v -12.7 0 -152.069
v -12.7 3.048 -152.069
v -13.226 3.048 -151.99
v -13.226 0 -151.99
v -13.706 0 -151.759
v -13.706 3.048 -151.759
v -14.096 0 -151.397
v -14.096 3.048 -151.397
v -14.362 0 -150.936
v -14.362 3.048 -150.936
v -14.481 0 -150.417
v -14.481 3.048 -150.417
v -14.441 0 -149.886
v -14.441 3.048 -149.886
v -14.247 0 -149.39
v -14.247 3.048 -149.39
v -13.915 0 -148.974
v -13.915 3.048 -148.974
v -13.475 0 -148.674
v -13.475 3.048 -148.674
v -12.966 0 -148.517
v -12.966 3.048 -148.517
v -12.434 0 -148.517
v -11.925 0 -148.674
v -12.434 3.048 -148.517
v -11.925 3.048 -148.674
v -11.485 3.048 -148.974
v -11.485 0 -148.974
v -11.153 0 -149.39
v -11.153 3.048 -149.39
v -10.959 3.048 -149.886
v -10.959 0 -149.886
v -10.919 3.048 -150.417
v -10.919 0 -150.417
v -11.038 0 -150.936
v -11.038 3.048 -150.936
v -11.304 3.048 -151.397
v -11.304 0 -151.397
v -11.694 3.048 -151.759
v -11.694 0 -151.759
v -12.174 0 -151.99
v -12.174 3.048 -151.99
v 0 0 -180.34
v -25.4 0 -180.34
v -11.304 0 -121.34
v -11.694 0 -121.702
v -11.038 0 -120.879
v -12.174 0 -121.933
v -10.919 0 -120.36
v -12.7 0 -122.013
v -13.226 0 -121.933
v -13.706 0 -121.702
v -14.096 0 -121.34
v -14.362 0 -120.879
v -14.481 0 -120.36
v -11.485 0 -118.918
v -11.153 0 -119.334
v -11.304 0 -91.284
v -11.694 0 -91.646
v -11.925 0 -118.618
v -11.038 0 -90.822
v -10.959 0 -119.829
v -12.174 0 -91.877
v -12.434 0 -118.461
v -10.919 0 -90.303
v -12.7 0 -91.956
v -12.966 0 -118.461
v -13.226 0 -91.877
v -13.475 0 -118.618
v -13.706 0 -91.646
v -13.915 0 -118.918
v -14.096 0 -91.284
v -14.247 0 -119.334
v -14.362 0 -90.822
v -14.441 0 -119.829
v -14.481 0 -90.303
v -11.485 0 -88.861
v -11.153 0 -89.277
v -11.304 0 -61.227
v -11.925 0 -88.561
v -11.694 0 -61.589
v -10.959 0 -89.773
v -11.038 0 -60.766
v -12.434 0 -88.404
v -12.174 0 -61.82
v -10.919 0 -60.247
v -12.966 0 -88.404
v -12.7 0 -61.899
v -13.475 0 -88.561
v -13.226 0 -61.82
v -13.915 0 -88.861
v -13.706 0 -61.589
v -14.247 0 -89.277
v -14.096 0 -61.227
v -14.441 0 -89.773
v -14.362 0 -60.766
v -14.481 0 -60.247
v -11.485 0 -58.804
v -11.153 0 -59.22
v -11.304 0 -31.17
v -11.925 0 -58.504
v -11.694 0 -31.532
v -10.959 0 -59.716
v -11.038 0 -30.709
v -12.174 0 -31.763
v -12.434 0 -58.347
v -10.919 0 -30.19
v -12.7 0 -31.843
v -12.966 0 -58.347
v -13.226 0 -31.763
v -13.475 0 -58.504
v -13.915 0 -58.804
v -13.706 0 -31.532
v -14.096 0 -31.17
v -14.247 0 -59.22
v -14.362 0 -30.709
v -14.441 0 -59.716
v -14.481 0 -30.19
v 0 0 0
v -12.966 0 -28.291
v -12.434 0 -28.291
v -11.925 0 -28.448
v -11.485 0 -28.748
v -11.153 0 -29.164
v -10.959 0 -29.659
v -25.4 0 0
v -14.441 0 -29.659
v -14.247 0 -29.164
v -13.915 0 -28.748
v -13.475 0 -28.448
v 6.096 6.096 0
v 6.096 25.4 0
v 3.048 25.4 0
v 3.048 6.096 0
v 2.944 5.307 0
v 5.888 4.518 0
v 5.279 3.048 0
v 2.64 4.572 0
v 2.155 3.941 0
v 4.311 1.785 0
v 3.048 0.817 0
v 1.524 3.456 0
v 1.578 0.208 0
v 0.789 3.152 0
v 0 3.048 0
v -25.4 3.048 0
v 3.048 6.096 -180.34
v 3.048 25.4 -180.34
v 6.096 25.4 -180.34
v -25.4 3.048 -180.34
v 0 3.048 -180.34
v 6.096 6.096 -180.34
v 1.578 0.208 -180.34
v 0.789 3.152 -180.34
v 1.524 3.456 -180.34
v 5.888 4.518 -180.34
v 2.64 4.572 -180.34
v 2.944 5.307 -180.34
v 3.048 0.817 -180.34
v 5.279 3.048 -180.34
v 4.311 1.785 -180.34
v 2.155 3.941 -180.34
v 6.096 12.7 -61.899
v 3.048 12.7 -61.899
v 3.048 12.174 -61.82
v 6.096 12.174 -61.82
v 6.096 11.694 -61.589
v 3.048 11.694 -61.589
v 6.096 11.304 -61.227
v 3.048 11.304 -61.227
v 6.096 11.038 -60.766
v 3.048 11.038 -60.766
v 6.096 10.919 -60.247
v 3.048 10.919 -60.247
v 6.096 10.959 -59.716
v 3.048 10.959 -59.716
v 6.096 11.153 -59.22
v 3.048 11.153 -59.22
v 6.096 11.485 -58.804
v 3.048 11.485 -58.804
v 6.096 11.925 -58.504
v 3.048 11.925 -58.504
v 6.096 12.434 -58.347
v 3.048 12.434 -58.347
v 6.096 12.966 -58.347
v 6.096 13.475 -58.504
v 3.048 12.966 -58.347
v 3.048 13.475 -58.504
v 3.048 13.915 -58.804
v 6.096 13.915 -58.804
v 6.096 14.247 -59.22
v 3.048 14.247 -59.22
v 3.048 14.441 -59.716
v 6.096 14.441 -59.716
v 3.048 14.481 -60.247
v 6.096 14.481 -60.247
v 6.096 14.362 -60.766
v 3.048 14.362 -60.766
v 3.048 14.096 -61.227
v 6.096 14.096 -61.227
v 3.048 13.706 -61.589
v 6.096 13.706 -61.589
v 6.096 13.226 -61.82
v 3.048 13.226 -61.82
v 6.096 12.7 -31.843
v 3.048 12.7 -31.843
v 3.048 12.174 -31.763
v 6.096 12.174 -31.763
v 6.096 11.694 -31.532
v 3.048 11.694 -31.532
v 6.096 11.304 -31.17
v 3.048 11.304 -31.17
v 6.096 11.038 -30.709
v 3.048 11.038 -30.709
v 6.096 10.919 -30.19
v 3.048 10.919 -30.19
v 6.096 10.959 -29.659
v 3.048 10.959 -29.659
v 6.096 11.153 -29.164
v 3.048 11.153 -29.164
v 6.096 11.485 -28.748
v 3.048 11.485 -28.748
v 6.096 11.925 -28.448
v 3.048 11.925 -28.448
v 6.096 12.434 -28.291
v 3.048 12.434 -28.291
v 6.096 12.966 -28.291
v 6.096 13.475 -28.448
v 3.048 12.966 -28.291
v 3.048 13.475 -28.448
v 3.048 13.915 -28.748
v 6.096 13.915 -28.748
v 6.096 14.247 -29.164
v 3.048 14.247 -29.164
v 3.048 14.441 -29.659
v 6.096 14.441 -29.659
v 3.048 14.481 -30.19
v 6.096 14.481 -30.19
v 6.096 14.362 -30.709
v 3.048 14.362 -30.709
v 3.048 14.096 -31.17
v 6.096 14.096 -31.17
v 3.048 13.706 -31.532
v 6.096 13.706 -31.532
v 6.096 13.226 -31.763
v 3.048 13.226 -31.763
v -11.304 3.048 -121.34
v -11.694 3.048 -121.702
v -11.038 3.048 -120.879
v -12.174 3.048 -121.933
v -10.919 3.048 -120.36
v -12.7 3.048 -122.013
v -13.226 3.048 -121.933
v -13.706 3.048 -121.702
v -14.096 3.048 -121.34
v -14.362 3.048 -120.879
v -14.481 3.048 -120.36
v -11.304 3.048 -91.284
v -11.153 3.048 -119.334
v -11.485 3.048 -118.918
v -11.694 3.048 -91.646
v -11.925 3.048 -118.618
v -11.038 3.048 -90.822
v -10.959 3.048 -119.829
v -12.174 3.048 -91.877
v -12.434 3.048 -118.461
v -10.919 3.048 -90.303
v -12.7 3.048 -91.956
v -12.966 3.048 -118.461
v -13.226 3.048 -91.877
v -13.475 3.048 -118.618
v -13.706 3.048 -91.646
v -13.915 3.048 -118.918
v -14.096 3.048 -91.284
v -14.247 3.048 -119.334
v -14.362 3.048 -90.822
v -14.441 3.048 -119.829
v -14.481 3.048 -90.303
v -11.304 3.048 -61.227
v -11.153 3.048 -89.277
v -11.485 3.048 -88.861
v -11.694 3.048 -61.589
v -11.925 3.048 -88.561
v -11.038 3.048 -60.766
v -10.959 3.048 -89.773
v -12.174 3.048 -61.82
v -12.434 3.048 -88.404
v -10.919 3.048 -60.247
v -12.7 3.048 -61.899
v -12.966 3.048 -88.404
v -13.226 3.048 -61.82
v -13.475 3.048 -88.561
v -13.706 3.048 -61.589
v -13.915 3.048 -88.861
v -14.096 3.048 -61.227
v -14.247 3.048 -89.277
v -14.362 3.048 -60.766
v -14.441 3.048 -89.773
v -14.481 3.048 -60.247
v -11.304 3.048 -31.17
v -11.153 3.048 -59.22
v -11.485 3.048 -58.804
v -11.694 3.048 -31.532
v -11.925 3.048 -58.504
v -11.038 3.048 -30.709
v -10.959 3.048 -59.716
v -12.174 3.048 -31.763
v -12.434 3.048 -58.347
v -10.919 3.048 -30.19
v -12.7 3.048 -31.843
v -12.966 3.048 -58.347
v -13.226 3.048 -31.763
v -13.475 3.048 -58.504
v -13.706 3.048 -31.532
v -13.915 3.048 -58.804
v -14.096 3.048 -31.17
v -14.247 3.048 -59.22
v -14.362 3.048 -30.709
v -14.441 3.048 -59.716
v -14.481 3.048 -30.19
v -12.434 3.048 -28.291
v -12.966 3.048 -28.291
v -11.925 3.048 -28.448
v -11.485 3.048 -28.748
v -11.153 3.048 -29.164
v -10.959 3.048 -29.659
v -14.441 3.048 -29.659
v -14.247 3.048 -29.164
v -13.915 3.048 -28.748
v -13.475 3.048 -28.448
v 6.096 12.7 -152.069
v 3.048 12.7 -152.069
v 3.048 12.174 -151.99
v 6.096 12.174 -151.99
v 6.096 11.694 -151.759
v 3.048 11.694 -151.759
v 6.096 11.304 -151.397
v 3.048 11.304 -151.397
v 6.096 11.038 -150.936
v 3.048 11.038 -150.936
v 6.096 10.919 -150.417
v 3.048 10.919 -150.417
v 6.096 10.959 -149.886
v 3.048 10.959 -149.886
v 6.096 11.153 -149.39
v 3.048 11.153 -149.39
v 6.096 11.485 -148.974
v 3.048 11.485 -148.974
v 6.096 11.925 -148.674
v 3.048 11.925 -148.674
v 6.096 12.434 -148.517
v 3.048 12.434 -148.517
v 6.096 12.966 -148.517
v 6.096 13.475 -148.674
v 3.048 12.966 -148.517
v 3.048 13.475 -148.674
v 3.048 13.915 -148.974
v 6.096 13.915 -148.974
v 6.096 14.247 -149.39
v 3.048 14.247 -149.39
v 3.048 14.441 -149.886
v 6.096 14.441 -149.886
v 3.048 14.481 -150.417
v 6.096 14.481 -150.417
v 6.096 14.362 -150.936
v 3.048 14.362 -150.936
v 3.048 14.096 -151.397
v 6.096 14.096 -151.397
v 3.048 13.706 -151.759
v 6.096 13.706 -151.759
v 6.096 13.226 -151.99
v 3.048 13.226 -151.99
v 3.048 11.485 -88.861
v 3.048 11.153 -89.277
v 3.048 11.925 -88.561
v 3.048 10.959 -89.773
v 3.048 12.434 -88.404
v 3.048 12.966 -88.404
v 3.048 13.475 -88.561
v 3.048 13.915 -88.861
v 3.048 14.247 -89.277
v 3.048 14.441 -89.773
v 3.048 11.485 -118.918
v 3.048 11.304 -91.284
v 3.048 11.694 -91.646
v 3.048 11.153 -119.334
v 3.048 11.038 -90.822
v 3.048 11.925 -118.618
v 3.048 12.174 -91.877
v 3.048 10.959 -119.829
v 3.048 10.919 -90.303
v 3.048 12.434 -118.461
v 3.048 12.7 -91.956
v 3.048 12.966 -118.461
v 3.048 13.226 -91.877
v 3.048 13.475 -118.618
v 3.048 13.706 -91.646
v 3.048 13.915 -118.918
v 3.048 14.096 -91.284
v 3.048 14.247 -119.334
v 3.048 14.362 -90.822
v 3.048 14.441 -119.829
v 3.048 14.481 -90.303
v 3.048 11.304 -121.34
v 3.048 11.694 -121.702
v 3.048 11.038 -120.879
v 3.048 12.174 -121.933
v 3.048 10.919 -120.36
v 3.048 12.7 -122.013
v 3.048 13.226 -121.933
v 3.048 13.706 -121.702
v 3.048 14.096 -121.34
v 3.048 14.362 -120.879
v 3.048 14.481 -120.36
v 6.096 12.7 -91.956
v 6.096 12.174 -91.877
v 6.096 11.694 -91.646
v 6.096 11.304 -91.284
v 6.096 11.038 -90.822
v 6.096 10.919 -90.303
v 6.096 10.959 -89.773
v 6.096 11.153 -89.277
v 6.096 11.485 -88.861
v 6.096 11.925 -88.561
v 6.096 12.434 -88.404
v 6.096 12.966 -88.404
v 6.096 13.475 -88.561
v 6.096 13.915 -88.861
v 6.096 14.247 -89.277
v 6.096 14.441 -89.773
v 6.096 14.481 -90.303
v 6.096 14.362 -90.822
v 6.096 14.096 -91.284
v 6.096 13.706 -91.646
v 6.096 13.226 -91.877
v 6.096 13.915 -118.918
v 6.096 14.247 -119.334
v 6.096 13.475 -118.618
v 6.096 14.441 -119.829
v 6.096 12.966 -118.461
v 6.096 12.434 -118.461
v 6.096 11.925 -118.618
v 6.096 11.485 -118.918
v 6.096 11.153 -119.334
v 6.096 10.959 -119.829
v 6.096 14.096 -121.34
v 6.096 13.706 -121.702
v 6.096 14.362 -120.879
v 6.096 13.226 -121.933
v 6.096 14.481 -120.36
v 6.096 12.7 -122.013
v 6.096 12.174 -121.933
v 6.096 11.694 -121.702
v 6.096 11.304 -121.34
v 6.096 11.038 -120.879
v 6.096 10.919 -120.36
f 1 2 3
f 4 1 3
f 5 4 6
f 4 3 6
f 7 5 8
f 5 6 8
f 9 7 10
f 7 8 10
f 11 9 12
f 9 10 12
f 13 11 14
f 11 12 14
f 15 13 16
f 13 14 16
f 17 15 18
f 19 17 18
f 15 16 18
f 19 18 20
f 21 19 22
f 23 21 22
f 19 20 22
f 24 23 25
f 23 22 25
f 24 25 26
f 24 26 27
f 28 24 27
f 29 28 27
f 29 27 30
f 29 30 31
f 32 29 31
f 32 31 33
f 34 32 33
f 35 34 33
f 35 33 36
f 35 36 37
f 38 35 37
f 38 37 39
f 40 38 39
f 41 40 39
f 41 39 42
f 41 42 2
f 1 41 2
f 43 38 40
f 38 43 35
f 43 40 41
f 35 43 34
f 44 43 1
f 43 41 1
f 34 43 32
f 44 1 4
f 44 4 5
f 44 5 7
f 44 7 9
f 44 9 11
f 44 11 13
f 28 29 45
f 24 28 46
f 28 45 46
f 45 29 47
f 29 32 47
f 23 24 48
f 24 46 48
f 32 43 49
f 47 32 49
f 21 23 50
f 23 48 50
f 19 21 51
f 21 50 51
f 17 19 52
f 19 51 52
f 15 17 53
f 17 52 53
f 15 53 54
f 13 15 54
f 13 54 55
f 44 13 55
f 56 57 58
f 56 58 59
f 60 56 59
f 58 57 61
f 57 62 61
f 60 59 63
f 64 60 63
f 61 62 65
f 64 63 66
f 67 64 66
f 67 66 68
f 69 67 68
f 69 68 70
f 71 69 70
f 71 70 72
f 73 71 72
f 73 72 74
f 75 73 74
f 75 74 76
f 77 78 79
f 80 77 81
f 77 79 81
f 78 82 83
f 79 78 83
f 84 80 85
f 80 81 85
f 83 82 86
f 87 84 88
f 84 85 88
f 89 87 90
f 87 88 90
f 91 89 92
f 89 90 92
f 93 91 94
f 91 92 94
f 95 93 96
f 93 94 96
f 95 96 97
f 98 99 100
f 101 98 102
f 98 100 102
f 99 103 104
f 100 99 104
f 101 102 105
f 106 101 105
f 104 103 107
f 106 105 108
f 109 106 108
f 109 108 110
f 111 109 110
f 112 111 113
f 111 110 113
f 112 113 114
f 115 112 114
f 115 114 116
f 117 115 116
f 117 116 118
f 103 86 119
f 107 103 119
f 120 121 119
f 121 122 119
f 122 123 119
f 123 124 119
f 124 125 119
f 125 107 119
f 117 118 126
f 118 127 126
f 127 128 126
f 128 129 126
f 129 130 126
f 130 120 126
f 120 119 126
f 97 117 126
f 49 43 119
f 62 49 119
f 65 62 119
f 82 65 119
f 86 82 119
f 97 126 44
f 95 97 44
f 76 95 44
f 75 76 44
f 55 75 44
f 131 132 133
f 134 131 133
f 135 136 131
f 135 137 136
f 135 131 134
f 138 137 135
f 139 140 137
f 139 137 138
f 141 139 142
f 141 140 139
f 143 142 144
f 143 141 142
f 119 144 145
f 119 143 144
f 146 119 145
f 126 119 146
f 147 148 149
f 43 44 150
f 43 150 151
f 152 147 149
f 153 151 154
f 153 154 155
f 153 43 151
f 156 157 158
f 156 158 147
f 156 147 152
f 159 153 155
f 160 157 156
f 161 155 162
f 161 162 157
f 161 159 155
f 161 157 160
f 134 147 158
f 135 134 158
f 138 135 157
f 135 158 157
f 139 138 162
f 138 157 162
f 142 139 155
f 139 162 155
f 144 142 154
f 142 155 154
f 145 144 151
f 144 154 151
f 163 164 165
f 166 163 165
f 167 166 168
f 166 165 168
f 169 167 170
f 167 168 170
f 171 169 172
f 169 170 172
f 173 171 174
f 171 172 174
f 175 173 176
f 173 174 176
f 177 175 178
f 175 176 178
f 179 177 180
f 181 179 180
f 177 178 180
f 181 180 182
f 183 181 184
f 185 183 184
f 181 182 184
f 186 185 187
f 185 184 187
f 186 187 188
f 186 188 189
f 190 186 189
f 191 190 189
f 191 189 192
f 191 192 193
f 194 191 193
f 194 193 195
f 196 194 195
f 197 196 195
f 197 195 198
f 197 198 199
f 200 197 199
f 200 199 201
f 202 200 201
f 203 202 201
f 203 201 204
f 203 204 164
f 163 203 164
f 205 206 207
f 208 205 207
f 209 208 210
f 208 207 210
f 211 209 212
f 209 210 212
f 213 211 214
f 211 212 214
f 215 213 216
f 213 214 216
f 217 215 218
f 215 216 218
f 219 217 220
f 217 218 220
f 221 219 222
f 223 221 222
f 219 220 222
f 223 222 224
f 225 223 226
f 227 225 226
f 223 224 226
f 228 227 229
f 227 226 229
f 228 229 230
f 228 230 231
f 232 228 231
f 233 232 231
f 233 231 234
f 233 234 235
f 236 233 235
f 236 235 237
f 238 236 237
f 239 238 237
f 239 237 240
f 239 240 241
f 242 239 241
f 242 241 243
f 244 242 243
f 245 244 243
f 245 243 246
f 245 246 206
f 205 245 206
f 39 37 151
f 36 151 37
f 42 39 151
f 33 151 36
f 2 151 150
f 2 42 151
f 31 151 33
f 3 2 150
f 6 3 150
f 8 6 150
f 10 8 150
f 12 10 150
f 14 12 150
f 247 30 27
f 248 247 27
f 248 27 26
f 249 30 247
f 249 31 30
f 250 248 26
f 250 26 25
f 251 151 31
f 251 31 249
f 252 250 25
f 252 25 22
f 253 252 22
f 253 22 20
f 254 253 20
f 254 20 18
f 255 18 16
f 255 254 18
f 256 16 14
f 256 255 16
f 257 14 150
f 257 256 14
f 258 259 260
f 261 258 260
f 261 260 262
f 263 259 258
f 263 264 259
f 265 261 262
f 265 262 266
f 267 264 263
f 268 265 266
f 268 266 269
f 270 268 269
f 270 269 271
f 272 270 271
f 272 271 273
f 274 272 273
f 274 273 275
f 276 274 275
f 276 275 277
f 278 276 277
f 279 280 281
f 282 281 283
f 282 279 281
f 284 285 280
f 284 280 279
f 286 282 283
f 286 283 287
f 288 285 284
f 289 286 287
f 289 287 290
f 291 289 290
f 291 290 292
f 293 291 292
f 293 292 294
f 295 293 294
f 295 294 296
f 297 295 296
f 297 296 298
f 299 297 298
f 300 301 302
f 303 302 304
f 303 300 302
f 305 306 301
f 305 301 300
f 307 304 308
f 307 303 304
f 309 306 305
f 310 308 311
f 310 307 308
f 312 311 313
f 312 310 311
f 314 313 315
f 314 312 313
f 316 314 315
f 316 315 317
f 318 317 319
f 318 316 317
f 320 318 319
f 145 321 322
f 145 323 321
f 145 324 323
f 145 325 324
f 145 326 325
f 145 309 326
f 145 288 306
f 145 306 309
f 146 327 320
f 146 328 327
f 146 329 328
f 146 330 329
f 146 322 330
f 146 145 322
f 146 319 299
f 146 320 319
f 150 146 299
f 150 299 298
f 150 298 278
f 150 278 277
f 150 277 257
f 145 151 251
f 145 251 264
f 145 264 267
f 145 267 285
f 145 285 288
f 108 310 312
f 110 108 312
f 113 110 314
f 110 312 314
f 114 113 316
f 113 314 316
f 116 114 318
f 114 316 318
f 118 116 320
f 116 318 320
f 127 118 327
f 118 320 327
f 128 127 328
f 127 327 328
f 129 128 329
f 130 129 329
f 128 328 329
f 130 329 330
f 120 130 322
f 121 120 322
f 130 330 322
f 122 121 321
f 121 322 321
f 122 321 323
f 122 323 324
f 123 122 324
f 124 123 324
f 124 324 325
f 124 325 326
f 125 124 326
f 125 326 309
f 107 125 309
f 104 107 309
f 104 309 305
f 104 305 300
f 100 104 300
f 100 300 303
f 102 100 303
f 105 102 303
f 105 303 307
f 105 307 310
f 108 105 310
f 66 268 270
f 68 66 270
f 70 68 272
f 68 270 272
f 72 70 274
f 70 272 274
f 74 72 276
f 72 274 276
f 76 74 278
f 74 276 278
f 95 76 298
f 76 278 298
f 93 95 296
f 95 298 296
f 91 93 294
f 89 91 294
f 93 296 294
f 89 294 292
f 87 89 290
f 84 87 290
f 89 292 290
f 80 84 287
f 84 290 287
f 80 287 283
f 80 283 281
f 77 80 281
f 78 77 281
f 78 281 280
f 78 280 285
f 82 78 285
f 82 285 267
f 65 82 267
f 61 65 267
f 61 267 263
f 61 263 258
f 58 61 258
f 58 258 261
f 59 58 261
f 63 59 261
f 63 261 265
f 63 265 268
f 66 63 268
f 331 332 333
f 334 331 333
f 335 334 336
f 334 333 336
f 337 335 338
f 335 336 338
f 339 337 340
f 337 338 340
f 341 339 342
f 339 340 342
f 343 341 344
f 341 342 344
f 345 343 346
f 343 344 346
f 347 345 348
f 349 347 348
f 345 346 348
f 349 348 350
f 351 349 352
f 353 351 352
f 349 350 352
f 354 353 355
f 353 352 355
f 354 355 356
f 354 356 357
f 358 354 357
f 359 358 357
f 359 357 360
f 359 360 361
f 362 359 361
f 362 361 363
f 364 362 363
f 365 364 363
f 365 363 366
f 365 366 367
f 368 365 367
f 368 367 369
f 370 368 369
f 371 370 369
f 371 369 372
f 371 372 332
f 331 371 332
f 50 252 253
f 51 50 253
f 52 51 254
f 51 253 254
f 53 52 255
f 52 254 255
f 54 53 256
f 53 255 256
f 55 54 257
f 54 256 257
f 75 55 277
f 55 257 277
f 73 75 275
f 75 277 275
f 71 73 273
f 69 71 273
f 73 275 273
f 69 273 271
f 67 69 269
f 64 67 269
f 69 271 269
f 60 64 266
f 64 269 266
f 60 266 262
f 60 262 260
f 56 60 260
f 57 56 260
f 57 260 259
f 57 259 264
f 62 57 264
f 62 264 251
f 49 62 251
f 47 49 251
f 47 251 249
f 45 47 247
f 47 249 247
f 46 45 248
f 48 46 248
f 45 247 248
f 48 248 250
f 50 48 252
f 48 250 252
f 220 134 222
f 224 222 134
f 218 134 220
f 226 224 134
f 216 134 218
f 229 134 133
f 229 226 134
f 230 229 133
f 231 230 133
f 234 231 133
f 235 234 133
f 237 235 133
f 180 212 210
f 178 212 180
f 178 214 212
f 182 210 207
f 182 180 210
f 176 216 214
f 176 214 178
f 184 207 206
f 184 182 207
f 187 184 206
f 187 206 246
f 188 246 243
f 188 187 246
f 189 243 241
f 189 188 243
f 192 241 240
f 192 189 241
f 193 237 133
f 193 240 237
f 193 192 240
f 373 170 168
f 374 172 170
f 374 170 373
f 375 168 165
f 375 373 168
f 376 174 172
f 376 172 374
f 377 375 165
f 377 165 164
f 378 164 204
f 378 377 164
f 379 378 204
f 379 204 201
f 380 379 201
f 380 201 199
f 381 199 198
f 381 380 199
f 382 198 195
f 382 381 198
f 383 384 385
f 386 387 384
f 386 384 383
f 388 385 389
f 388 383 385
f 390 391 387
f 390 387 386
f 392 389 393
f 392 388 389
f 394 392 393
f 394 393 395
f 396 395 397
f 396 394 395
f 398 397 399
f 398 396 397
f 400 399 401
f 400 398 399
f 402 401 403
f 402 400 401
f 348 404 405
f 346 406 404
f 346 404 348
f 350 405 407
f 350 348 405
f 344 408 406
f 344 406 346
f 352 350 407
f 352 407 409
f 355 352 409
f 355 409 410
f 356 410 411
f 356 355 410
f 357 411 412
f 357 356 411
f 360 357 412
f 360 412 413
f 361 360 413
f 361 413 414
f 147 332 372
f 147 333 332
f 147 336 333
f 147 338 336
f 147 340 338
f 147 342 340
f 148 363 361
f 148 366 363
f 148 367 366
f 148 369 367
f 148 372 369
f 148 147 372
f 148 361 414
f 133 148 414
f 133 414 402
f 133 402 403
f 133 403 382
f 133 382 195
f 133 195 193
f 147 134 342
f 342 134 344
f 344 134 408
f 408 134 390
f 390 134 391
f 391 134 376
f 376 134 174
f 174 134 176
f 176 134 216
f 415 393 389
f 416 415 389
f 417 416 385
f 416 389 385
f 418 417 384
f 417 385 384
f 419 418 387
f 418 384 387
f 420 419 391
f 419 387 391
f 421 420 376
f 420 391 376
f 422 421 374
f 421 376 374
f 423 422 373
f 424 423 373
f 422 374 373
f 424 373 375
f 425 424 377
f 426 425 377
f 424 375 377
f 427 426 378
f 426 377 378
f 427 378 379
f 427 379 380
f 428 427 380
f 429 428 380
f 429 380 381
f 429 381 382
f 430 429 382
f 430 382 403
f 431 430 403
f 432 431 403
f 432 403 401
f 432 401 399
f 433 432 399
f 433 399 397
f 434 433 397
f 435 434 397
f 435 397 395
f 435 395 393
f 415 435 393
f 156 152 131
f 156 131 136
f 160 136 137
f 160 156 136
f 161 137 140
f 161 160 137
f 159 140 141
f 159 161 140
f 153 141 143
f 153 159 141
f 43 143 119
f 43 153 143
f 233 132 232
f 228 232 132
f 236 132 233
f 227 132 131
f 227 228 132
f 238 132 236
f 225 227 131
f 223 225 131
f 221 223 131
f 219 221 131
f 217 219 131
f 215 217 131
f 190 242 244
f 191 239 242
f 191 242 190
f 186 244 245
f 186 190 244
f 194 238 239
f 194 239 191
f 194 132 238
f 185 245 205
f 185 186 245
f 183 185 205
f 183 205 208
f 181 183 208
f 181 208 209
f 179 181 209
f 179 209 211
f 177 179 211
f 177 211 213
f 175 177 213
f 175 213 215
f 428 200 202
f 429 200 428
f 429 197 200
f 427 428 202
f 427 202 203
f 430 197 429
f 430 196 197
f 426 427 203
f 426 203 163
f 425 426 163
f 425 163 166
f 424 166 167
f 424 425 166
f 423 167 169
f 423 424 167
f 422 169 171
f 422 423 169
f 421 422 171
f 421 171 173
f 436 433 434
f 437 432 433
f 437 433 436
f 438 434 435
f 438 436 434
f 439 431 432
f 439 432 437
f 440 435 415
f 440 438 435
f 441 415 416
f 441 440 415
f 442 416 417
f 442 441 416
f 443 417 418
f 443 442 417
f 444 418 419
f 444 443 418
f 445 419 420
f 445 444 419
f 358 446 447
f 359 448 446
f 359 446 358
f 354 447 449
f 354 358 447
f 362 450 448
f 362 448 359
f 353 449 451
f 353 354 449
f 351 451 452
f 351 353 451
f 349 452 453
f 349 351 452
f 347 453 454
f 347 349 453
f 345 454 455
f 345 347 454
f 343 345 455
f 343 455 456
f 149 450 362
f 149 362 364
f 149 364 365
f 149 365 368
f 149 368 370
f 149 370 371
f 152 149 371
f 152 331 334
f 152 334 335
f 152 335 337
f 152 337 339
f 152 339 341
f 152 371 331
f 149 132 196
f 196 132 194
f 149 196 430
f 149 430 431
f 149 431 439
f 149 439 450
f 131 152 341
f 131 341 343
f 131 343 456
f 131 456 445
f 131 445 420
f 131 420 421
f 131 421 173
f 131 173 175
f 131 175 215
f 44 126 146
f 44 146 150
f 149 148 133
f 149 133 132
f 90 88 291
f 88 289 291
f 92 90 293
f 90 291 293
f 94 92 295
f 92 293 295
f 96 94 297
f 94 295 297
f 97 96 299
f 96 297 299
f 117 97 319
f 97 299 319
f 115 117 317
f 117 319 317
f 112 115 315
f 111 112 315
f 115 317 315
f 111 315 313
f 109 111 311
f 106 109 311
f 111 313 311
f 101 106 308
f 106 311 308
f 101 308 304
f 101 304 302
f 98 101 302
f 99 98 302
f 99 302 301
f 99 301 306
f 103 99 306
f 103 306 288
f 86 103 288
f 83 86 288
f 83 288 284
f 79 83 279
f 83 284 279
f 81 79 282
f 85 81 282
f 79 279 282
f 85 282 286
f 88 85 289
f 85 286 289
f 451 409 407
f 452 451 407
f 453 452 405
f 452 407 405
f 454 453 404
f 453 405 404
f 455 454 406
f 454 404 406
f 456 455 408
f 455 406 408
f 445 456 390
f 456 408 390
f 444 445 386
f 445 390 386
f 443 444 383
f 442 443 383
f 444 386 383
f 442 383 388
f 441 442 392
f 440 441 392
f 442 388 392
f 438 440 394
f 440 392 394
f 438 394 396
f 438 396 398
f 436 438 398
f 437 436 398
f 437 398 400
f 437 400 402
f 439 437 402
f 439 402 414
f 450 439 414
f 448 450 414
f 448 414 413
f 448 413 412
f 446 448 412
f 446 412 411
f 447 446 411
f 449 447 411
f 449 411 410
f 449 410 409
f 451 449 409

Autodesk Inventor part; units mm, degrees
ref_plane "YZ Plane" through (0, 0, 0) normal (1, 0, 0) x (0, 1, 0)
ref_plane "XZ Plane" through (0, 0, 0) normal (0, 1, 0) x (-1, 0, 0)
ref_plane "XY Plane" through (0, 0, 0) normal (0, 0, 1) x (1, 0, 0)
sketch "Sketch1" plane through (0, 0, 0) normal (0, 1, 0) x (-1, 0, 0)
  line L0 (0, 0) -> (25.4, 0)
  line L1 (25.4, 0) -> (25.4, -180.34)
  line L2 (25.4, -180.34) -> (0, -180.34)
  line L3 (0, -180.34) -> (0, 0)
  dimension "d0" = 25.4
  dimension "d1" = 180.34
extrude "Plate1" add sketch "Sketch1" along normal blind 3.048
sketch "Sketch2" plane through (3.048, 6.096, -180.34) normal (1, 0, 0) x (0, 1, 0)
  line L0 (0, 180.34) -> (0, 0)
  line L1 (0, 0) -> (19.304, 0)
  line L2 (19.304, 0) -> (19.304, 180.34)
  line L3 (19.304, 180.34) -> (0, 180.34)
edge flange "Flange1" height 25.4 angle 90 thickness 3.048 bend radius 3.048 thickness toward (1, 0, 0) relief tear relief width 3.048 relief depth 1.524 edges at (0, 3.048, -90.17) wall of the first edge with corners at (3.048, 6.096, 0) (3.048, 6.096, -180.34) (3.048, 25.4, -180.34) (3.048, 25.4, 0)
bend "Bend1"
corner "Corner1"
sketch "Sketch3" plane through (0, 0, 0) normal (0, -1, 0) x (1, 0, 0)
  line L0 (-25.4, 0) -> (-25.4, -180.34) projected
  line L1 (-25.4, -180.34) -> (0, -180.34) construction
  line L2 (-12.7, -180.34) -> (-12.7, -150.2833) construction
  line L3 (-12.7, -150.2833) -> (-12.7, -120.2267) construction
  line L4 (-12.7, -120.2267) -> (-12.7, -90.17) construction
  line L5 (-12.7, -90.17) -> (-12.7, -60.1133) construction
  line L6 (-12.7, -60.1133) -> (-12.7, -30.0567) construction
  line L7 (-12.7, -30.0567) -> (-12.7, 0) construction
  line L8 (0, 0) -> (-25.4, 0) construction
  dimension "d13" = 12.7
hole "Hole1" at (-12.7, 0, -120.2267) at (-12.7, 0, -150.2833) at (-12.7, 0, -90.17) at (-12.7, 0, -60.1133) at (-12.7, 0, -30.0567) direction (0, 1, 0) diameter 3.5719 depth 3.048 tip angle 118
sketch "Sketch4" plane through (6.096, 25.4, 0) normal (1, 0, 0) x (0, 0, -1)
  line L0 (0, -12.7) -> (30.0567, -12.7) construction
  line L1 (30.0567, -12.7) -> (60.1133, -12.7) construction
  line L2 (60.1133, -12.7) -> (90.17, -12.7) construction
  line L3 (90.17, -12.7) -> (120.2267, -12.7) construction
  line L4 (120.2267, -12.7) -> (150.2833, -12.7) construction
  line L5 (150.2833, -12.7) -> (180.34, -12.7) construction
  line L6 (180.34, -25.4) -> (0, -25.4) projected
  line L7 (180.34, 0) -> (180.34, -19.304) projected
  line L8 (0, -19.304) -> (0, 0) projected
  dimension "d21" = 12.7
hole "Hole2" at (6.096, 12.7, -30.0567) at (6.096, 12.7, -60.1133) at (6.096, 12.7, -90.17) at (6.096, 12.7, -120.2267) at (6.096, 12.7, -150.2833) direction (-1, 0, 0) diameter 3.5719 depth 3.048 tip angle 118
equation "\"d0\" = cb_outer_diameter"
equation "\"d1\" = bh_length"
equation "\"d13\" = 0.5 * cb_outer_diameter"
equation "\"d14\" = rv_hole_diameter"
equation "\"d19\" = Thickness"
equation "\"d21\" = 0.5 * cb_outer_diameter"
equation "\"d22\" = rv_hole_diameter"
equation "\"d27\" = Thickness"
equation "\"d3\" = BendReliefWidth"
equation "\"d4\" = BendReliefDepth"
equation "\"d5\" = MinimumRemnant"
equation "\"d6\" = BendRadius"
equation "\"d9\" = BendRadius"
equation "\"d10\" = CornerReliefSize"
equation "\"d11\" = GapSize"
equation "\"d12\" = JacobiRadiusSize"
equation "\"BendRadius\" = Thickness"
equation "\"BendReliefWidth\" = Thickness"
equation "\"BendReliefDepth\" = 0.5 * Thickness"
equation "\"CornerReliefSize\" = 4 * Thickness"
equation "\"MinimumRemnant\" = 2 * Thickness"
equation "\"TransitionRadius\" = BendRadius"
equation "\"JacobiRadiusSize\" = BendRadius"
equation "\"GapSize\" = Thickness"
equation "\"bh_width\" = 87.63"
equation "\"bh_length\" = 180.34"
equation "\"bh_height\" = 25.4"
equation "\"bh_metal_width\" = 3.048"
equation "\"cpn_diameter\" = 69.85"
equation "\"cpn_length\" = 311.15"
equation "\"cmp_foot_seperation_long\" = 139.954"
equation "\"cmp_foot_seperation_short\" = 36.068"
equation "\"cmp_mounting_margins\" = 6.35"
equation "\"cmp_foot_bolt_diameter\" = 6.35"
equation "\"spd_fillet_size\" = 3.175"
equation "\"cb_outer_diameter\" = 25.4"
equation "\"cb_wall_thickness\" = 1.5875"
equation "\"cb_length\" = 508"
equation "\"pdb_mounting_holes_short\" = 104.394"
equation "\"cb_pdb_low_mount_offset\" = 25.4"
equation "\"pdb_mounting_holes_long\" = 182.2704"
equation "\"pdb_ziptie_hole_diameter\" = 5.334"
equation "\"d2\" = BendRadius"
equation "\"rv_hole_diameter\" = 3.57187"
equation "\"Thickness\" = 3.048"
properties part number "long_angle_bracket"
